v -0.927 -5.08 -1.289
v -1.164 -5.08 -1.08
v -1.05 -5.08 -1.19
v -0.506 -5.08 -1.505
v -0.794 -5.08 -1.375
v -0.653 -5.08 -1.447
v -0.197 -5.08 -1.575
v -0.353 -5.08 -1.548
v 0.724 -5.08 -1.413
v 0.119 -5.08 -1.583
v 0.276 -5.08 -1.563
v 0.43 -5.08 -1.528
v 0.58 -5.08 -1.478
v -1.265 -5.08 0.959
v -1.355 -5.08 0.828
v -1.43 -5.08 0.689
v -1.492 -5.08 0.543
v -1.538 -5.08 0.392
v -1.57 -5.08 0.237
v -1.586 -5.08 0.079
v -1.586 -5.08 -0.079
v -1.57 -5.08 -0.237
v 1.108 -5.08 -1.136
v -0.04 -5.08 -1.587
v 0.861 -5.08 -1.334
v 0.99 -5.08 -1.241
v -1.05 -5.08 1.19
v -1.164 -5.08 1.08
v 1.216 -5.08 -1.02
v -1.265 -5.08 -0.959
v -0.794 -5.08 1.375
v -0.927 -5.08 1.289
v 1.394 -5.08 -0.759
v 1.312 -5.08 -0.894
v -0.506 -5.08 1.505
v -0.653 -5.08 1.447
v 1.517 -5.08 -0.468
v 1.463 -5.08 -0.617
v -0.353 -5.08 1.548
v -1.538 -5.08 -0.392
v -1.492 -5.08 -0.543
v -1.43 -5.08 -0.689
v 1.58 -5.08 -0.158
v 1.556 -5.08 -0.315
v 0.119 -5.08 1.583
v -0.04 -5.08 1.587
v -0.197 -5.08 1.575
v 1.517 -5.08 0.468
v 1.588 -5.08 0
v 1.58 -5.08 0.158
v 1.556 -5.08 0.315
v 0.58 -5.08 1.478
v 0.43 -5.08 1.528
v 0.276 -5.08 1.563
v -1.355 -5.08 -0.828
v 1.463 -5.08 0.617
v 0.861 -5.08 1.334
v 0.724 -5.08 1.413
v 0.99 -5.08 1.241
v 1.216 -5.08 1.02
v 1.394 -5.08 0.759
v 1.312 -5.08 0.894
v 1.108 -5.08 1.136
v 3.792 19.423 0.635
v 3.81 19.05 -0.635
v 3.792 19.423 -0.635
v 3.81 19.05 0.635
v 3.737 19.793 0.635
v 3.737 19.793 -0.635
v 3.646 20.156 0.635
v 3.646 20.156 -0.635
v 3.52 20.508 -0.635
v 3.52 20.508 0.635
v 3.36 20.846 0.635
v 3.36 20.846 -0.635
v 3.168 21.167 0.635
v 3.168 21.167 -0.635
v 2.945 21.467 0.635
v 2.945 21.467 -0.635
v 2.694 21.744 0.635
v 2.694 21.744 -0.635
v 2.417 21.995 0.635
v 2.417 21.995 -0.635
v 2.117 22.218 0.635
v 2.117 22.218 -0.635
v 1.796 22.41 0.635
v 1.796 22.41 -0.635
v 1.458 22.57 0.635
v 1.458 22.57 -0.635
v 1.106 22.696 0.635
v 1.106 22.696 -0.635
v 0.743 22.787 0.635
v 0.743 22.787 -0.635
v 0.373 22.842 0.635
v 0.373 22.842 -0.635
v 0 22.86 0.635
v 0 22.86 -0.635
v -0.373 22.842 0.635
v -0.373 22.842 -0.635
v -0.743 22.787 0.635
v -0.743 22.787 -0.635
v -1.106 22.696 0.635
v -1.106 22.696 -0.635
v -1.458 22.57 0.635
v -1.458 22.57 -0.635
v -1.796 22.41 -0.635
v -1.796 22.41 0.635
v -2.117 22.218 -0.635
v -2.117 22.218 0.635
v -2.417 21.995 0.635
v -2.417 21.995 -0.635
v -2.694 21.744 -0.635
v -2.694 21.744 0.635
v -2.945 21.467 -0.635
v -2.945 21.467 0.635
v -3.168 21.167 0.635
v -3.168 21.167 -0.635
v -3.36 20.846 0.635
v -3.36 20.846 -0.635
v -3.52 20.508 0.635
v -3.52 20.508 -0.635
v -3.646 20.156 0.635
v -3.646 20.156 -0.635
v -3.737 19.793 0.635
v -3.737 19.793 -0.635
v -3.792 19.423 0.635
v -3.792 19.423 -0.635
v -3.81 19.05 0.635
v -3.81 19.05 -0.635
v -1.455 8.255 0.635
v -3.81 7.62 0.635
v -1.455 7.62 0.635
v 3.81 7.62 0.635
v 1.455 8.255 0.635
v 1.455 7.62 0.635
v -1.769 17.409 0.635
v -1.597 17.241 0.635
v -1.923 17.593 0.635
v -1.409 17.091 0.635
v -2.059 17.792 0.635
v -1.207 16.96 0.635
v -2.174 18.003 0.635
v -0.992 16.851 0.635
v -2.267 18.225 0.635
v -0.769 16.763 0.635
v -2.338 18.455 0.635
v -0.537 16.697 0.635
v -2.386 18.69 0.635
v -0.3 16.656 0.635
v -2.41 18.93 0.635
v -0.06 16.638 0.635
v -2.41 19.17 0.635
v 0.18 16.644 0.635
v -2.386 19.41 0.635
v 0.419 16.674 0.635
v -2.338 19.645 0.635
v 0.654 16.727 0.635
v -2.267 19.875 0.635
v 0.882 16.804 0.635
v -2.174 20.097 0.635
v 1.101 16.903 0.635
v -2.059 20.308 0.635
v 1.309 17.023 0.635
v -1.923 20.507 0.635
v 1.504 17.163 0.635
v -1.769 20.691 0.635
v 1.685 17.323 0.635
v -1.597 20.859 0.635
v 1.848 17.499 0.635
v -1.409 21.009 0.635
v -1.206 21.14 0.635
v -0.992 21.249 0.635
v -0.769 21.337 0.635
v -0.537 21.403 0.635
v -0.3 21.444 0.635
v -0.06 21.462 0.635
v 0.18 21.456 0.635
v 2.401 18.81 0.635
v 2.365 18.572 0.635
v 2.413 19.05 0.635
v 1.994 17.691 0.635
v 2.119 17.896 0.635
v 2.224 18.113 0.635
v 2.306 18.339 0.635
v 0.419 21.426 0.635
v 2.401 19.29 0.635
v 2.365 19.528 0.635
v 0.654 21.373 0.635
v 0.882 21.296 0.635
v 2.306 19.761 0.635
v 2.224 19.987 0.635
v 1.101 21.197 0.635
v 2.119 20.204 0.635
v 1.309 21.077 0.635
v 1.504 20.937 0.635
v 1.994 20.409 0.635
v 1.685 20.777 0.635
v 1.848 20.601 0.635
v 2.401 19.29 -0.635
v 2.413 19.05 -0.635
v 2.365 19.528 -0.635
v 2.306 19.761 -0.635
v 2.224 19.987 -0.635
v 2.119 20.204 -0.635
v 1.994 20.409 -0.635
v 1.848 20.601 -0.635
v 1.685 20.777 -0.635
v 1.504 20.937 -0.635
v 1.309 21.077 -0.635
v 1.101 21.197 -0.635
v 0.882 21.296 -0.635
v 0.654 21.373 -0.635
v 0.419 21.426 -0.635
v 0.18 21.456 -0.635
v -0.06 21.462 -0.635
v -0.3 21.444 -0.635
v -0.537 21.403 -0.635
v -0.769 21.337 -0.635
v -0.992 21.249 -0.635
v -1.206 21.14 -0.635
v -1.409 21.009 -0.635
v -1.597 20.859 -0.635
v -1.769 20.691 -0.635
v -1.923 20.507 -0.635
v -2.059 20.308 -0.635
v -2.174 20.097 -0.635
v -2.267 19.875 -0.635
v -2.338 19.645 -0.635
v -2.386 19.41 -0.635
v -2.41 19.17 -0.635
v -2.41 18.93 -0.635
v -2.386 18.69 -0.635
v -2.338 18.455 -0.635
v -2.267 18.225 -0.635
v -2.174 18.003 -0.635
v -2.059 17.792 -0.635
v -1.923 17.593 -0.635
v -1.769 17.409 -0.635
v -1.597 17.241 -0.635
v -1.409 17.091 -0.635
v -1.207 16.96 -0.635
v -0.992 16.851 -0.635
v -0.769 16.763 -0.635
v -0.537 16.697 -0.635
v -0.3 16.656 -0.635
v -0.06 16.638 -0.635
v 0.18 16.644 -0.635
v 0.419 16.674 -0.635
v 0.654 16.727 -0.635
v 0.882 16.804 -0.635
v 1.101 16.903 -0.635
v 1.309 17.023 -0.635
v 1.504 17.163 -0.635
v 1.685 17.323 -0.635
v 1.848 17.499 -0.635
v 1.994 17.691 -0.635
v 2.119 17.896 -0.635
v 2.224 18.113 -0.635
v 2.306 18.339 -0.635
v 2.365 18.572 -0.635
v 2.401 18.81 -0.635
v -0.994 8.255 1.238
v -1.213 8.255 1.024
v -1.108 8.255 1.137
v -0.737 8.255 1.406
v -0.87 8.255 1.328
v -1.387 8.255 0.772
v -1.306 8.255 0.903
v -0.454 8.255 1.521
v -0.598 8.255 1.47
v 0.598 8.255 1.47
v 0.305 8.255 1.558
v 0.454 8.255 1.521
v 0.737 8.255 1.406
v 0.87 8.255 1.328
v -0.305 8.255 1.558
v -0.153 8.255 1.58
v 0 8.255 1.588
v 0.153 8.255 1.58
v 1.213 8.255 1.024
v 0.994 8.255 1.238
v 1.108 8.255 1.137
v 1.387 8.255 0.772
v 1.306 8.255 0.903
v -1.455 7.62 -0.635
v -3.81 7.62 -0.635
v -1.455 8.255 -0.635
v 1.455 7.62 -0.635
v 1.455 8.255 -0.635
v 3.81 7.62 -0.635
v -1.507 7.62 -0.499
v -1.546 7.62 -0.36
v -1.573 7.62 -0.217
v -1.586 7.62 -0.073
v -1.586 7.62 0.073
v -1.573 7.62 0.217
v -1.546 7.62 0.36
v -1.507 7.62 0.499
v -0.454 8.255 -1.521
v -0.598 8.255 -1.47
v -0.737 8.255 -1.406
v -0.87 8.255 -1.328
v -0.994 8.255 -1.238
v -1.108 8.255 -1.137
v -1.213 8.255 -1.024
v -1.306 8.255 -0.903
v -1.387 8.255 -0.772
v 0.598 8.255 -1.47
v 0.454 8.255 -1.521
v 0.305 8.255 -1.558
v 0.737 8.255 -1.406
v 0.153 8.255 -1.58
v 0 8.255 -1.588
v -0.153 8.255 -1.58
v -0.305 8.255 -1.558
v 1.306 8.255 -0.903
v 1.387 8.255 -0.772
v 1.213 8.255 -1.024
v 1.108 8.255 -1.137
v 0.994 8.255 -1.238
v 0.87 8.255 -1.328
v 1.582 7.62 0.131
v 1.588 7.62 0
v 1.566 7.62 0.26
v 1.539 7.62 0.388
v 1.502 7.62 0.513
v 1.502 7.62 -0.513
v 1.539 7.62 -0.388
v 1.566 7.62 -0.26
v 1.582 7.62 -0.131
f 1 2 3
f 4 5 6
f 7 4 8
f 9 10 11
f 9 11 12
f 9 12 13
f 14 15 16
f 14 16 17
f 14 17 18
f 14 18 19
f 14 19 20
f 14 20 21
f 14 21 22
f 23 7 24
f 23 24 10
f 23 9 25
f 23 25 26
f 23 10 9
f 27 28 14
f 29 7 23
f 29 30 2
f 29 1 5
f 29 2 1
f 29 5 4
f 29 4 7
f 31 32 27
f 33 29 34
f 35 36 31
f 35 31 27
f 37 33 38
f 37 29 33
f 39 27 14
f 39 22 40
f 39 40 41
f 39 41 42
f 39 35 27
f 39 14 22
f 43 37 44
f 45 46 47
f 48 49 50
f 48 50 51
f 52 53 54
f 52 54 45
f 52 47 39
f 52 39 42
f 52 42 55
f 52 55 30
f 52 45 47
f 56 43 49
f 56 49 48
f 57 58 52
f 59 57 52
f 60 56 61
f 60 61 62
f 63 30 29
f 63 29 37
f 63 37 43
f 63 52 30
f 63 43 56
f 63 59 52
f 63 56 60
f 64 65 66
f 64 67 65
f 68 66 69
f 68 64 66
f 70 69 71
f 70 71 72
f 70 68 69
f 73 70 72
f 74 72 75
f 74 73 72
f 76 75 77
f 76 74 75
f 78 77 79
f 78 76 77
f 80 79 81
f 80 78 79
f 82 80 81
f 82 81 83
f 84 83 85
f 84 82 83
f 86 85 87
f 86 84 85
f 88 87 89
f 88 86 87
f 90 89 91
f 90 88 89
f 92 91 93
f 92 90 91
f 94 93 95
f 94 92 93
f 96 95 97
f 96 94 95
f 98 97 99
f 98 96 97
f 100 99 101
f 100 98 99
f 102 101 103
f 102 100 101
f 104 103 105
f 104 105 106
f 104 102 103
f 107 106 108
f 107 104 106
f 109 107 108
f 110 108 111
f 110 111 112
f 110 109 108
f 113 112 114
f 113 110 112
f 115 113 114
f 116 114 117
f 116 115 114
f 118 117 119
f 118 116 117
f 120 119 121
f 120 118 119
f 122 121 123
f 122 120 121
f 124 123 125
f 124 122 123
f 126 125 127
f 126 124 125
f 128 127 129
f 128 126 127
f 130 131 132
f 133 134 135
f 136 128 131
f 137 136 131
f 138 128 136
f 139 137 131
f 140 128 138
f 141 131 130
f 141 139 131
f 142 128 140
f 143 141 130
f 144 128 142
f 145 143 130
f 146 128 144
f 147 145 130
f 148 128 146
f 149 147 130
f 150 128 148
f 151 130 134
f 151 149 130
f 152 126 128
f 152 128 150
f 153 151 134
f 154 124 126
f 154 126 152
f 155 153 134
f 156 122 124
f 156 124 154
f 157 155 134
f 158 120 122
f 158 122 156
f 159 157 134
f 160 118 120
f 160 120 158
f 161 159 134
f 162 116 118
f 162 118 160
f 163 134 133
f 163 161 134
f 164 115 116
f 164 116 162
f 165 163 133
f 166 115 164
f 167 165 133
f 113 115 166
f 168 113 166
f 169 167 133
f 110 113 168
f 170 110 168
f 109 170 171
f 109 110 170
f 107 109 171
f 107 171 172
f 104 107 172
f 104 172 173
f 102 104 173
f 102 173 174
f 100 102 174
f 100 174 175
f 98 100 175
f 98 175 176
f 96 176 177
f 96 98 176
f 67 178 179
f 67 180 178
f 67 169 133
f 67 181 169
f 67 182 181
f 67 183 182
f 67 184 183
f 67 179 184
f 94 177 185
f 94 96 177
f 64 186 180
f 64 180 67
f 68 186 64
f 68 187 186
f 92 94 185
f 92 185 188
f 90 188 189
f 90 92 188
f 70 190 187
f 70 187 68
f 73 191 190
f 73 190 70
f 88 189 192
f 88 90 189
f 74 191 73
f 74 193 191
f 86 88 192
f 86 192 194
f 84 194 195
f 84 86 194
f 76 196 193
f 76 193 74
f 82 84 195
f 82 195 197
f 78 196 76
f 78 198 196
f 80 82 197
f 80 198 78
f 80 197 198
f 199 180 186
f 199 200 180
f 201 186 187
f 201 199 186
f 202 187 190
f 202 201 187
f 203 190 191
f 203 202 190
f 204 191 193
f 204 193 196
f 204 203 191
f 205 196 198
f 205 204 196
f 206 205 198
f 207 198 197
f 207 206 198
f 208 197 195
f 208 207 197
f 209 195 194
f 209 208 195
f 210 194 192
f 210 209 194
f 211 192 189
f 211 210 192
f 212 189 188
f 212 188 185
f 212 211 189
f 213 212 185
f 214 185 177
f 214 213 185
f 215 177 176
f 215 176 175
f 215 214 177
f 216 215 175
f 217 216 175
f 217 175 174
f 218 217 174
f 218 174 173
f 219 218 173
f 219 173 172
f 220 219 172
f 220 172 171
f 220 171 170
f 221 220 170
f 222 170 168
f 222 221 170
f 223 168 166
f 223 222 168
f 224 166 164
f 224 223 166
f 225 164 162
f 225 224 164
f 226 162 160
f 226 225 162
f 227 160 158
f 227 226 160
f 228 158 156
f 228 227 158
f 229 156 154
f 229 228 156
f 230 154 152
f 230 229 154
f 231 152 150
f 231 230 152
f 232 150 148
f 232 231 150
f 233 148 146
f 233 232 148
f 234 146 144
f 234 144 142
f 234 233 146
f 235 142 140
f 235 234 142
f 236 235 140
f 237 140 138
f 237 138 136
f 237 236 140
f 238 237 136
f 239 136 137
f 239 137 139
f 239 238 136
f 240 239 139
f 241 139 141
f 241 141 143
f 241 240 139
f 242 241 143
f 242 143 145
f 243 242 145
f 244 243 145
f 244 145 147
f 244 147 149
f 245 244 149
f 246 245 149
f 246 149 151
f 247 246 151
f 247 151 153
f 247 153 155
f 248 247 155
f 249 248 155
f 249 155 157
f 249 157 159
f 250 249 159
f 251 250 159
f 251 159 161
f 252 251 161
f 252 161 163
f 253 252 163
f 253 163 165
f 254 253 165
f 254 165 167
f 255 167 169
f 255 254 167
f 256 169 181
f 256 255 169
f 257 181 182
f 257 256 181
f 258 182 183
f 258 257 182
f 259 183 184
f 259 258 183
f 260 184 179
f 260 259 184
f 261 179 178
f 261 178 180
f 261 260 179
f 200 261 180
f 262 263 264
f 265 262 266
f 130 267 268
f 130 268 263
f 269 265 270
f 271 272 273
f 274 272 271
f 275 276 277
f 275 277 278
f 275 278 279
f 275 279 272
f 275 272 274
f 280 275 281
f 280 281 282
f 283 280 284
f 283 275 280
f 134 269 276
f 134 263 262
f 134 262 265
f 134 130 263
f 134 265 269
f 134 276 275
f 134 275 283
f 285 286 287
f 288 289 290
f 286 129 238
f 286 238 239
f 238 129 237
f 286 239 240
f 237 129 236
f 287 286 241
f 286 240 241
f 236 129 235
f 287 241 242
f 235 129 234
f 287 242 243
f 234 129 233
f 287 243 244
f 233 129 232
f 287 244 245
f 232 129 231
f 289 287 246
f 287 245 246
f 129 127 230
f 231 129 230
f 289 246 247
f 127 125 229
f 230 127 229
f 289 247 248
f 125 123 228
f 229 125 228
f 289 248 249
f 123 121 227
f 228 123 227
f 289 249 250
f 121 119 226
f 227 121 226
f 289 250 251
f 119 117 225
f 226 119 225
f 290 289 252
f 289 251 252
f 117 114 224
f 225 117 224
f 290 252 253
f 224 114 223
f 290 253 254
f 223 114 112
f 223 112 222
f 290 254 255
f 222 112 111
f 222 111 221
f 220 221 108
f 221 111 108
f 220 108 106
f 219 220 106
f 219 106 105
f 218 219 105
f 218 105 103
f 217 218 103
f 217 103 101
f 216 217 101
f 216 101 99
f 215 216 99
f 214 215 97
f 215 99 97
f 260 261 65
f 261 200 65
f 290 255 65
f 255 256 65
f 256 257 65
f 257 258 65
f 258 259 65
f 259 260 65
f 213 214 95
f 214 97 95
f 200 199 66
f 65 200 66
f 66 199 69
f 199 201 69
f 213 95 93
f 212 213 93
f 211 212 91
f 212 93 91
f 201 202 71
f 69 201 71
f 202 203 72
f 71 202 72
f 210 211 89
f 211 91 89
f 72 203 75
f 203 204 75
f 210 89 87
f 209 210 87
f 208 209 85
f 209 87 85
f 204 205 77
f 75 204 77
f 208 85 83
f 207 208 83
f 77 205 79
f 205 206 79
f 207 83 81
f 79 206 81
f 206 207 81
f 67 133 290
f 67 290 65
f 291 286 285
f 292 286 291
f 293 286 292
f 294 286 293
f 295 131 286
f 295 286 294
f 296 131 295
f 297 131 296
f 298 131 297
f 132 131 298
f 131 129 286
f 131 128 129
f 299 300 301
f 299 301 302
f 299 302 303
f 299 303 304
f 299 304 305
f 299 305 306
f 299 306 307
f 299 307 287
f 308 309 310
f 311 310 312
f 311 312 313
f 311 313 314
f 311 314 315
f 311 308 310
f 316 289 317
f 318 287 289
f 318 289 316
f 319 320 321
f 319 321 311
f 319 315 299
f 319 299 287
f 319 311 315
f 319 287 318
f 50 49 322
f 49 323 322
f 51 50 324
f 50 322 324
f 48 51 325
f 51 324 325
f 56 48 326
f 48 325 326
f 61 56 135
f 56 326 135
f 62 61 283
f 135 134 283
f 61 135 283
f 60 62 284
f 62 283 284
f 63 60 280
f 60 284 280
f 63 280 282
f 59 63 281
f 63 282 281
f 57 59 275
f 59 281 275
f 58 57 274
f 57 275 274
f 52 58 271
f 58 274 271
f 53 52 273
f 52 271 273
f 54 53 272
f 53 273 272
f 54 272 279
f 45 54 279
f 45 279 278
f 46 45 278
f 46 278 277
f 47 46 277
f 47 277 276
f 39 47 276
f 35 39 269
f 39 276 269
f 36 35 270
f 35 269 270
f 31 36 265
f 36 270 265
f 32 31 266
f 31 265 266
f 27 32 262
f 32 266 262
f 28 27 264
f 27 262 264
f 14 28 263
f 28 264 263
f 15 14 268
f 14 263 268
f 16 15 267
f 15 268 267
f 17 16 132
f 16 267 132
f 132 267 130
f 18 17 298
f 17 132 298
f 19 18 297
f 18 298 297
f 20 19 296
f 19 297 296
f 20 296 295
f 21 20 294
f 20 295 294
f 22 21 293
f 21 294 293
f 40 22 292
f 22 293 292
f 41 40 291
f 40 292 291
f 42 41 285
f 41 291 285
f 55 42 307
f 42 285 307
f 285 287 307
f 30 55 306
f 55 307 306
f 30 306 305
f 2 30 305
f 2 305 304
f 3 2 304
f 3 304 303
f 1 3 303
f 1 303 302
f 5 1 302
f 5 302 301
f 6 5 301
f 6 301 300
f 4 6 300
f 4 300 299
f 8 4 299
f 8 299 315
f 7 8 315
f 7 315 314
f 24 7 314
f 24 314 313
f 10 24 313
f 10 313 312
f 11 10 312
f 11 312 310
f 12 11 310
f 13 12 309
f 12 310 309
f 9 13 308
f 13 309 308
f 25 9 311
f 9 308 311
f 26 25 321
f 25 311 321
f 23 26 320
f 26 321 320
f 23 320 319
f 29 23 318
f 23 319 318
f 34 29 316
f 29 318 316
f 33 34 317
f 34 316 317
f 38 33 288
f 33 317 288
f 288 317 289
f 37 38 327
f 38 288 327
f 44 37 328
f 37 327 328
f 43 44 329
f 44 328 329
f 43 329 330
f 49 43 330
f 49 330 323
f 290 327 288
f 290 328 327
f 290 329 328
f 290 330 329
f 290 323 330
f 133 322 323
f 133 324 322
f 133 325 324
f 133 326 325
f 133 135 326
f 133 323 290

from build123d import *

# Parameters (mm, degrees)
SKETCH1_R      = 1.5875
EXTRUDE1_DEPTH = 8.255
SKETCH2_R      = 2.413
EXTRUDE2_DEPTH = 0.635
SKETCH3_R      = 1.5875
EXTRUDE3_DEPTH = 5.08


with BuildPart() as part:
    # Sketch1 → Extrude1 (new body)
    with BuildSketch(Plane(origin=(0, 0, 0), x_dir=(1, 0, 0), z_dir=(0, 1, 0))):
        Circle(SKETCH1_R)
    extrude(amount=EXTRUDE1_DEPTH)

    # Sketch2 → Extrude2 (add, symmetric)
    with BuildSketch(Plane.XY):
        with BuildLine():
            Line((-3.81, 19.05), (-3.81, 7.62))
            Line((-3.81, 7.62), (3.81, 7.62))
            Line((3.81, 7.62), (3.81, 19.05))
            ThreePointArc((3.81, 19.05), (0, 22.86), (-3.81, 19.05))
        make_face()
        with Locations((0, 19.05)):
            Circle(SKETCH2_R, mode=Mode.SUBTRACT)
    extrude(amount=EXTRUDE2_DEPTH, both=True)

    # Sketch3 → Extrude3 (add)
    with BuildSketch(Plane.XZ):
        Circle(SKETCH3_R)
    extrude(amount=EXTRUDE3_DEPTH)


solid = part.part
